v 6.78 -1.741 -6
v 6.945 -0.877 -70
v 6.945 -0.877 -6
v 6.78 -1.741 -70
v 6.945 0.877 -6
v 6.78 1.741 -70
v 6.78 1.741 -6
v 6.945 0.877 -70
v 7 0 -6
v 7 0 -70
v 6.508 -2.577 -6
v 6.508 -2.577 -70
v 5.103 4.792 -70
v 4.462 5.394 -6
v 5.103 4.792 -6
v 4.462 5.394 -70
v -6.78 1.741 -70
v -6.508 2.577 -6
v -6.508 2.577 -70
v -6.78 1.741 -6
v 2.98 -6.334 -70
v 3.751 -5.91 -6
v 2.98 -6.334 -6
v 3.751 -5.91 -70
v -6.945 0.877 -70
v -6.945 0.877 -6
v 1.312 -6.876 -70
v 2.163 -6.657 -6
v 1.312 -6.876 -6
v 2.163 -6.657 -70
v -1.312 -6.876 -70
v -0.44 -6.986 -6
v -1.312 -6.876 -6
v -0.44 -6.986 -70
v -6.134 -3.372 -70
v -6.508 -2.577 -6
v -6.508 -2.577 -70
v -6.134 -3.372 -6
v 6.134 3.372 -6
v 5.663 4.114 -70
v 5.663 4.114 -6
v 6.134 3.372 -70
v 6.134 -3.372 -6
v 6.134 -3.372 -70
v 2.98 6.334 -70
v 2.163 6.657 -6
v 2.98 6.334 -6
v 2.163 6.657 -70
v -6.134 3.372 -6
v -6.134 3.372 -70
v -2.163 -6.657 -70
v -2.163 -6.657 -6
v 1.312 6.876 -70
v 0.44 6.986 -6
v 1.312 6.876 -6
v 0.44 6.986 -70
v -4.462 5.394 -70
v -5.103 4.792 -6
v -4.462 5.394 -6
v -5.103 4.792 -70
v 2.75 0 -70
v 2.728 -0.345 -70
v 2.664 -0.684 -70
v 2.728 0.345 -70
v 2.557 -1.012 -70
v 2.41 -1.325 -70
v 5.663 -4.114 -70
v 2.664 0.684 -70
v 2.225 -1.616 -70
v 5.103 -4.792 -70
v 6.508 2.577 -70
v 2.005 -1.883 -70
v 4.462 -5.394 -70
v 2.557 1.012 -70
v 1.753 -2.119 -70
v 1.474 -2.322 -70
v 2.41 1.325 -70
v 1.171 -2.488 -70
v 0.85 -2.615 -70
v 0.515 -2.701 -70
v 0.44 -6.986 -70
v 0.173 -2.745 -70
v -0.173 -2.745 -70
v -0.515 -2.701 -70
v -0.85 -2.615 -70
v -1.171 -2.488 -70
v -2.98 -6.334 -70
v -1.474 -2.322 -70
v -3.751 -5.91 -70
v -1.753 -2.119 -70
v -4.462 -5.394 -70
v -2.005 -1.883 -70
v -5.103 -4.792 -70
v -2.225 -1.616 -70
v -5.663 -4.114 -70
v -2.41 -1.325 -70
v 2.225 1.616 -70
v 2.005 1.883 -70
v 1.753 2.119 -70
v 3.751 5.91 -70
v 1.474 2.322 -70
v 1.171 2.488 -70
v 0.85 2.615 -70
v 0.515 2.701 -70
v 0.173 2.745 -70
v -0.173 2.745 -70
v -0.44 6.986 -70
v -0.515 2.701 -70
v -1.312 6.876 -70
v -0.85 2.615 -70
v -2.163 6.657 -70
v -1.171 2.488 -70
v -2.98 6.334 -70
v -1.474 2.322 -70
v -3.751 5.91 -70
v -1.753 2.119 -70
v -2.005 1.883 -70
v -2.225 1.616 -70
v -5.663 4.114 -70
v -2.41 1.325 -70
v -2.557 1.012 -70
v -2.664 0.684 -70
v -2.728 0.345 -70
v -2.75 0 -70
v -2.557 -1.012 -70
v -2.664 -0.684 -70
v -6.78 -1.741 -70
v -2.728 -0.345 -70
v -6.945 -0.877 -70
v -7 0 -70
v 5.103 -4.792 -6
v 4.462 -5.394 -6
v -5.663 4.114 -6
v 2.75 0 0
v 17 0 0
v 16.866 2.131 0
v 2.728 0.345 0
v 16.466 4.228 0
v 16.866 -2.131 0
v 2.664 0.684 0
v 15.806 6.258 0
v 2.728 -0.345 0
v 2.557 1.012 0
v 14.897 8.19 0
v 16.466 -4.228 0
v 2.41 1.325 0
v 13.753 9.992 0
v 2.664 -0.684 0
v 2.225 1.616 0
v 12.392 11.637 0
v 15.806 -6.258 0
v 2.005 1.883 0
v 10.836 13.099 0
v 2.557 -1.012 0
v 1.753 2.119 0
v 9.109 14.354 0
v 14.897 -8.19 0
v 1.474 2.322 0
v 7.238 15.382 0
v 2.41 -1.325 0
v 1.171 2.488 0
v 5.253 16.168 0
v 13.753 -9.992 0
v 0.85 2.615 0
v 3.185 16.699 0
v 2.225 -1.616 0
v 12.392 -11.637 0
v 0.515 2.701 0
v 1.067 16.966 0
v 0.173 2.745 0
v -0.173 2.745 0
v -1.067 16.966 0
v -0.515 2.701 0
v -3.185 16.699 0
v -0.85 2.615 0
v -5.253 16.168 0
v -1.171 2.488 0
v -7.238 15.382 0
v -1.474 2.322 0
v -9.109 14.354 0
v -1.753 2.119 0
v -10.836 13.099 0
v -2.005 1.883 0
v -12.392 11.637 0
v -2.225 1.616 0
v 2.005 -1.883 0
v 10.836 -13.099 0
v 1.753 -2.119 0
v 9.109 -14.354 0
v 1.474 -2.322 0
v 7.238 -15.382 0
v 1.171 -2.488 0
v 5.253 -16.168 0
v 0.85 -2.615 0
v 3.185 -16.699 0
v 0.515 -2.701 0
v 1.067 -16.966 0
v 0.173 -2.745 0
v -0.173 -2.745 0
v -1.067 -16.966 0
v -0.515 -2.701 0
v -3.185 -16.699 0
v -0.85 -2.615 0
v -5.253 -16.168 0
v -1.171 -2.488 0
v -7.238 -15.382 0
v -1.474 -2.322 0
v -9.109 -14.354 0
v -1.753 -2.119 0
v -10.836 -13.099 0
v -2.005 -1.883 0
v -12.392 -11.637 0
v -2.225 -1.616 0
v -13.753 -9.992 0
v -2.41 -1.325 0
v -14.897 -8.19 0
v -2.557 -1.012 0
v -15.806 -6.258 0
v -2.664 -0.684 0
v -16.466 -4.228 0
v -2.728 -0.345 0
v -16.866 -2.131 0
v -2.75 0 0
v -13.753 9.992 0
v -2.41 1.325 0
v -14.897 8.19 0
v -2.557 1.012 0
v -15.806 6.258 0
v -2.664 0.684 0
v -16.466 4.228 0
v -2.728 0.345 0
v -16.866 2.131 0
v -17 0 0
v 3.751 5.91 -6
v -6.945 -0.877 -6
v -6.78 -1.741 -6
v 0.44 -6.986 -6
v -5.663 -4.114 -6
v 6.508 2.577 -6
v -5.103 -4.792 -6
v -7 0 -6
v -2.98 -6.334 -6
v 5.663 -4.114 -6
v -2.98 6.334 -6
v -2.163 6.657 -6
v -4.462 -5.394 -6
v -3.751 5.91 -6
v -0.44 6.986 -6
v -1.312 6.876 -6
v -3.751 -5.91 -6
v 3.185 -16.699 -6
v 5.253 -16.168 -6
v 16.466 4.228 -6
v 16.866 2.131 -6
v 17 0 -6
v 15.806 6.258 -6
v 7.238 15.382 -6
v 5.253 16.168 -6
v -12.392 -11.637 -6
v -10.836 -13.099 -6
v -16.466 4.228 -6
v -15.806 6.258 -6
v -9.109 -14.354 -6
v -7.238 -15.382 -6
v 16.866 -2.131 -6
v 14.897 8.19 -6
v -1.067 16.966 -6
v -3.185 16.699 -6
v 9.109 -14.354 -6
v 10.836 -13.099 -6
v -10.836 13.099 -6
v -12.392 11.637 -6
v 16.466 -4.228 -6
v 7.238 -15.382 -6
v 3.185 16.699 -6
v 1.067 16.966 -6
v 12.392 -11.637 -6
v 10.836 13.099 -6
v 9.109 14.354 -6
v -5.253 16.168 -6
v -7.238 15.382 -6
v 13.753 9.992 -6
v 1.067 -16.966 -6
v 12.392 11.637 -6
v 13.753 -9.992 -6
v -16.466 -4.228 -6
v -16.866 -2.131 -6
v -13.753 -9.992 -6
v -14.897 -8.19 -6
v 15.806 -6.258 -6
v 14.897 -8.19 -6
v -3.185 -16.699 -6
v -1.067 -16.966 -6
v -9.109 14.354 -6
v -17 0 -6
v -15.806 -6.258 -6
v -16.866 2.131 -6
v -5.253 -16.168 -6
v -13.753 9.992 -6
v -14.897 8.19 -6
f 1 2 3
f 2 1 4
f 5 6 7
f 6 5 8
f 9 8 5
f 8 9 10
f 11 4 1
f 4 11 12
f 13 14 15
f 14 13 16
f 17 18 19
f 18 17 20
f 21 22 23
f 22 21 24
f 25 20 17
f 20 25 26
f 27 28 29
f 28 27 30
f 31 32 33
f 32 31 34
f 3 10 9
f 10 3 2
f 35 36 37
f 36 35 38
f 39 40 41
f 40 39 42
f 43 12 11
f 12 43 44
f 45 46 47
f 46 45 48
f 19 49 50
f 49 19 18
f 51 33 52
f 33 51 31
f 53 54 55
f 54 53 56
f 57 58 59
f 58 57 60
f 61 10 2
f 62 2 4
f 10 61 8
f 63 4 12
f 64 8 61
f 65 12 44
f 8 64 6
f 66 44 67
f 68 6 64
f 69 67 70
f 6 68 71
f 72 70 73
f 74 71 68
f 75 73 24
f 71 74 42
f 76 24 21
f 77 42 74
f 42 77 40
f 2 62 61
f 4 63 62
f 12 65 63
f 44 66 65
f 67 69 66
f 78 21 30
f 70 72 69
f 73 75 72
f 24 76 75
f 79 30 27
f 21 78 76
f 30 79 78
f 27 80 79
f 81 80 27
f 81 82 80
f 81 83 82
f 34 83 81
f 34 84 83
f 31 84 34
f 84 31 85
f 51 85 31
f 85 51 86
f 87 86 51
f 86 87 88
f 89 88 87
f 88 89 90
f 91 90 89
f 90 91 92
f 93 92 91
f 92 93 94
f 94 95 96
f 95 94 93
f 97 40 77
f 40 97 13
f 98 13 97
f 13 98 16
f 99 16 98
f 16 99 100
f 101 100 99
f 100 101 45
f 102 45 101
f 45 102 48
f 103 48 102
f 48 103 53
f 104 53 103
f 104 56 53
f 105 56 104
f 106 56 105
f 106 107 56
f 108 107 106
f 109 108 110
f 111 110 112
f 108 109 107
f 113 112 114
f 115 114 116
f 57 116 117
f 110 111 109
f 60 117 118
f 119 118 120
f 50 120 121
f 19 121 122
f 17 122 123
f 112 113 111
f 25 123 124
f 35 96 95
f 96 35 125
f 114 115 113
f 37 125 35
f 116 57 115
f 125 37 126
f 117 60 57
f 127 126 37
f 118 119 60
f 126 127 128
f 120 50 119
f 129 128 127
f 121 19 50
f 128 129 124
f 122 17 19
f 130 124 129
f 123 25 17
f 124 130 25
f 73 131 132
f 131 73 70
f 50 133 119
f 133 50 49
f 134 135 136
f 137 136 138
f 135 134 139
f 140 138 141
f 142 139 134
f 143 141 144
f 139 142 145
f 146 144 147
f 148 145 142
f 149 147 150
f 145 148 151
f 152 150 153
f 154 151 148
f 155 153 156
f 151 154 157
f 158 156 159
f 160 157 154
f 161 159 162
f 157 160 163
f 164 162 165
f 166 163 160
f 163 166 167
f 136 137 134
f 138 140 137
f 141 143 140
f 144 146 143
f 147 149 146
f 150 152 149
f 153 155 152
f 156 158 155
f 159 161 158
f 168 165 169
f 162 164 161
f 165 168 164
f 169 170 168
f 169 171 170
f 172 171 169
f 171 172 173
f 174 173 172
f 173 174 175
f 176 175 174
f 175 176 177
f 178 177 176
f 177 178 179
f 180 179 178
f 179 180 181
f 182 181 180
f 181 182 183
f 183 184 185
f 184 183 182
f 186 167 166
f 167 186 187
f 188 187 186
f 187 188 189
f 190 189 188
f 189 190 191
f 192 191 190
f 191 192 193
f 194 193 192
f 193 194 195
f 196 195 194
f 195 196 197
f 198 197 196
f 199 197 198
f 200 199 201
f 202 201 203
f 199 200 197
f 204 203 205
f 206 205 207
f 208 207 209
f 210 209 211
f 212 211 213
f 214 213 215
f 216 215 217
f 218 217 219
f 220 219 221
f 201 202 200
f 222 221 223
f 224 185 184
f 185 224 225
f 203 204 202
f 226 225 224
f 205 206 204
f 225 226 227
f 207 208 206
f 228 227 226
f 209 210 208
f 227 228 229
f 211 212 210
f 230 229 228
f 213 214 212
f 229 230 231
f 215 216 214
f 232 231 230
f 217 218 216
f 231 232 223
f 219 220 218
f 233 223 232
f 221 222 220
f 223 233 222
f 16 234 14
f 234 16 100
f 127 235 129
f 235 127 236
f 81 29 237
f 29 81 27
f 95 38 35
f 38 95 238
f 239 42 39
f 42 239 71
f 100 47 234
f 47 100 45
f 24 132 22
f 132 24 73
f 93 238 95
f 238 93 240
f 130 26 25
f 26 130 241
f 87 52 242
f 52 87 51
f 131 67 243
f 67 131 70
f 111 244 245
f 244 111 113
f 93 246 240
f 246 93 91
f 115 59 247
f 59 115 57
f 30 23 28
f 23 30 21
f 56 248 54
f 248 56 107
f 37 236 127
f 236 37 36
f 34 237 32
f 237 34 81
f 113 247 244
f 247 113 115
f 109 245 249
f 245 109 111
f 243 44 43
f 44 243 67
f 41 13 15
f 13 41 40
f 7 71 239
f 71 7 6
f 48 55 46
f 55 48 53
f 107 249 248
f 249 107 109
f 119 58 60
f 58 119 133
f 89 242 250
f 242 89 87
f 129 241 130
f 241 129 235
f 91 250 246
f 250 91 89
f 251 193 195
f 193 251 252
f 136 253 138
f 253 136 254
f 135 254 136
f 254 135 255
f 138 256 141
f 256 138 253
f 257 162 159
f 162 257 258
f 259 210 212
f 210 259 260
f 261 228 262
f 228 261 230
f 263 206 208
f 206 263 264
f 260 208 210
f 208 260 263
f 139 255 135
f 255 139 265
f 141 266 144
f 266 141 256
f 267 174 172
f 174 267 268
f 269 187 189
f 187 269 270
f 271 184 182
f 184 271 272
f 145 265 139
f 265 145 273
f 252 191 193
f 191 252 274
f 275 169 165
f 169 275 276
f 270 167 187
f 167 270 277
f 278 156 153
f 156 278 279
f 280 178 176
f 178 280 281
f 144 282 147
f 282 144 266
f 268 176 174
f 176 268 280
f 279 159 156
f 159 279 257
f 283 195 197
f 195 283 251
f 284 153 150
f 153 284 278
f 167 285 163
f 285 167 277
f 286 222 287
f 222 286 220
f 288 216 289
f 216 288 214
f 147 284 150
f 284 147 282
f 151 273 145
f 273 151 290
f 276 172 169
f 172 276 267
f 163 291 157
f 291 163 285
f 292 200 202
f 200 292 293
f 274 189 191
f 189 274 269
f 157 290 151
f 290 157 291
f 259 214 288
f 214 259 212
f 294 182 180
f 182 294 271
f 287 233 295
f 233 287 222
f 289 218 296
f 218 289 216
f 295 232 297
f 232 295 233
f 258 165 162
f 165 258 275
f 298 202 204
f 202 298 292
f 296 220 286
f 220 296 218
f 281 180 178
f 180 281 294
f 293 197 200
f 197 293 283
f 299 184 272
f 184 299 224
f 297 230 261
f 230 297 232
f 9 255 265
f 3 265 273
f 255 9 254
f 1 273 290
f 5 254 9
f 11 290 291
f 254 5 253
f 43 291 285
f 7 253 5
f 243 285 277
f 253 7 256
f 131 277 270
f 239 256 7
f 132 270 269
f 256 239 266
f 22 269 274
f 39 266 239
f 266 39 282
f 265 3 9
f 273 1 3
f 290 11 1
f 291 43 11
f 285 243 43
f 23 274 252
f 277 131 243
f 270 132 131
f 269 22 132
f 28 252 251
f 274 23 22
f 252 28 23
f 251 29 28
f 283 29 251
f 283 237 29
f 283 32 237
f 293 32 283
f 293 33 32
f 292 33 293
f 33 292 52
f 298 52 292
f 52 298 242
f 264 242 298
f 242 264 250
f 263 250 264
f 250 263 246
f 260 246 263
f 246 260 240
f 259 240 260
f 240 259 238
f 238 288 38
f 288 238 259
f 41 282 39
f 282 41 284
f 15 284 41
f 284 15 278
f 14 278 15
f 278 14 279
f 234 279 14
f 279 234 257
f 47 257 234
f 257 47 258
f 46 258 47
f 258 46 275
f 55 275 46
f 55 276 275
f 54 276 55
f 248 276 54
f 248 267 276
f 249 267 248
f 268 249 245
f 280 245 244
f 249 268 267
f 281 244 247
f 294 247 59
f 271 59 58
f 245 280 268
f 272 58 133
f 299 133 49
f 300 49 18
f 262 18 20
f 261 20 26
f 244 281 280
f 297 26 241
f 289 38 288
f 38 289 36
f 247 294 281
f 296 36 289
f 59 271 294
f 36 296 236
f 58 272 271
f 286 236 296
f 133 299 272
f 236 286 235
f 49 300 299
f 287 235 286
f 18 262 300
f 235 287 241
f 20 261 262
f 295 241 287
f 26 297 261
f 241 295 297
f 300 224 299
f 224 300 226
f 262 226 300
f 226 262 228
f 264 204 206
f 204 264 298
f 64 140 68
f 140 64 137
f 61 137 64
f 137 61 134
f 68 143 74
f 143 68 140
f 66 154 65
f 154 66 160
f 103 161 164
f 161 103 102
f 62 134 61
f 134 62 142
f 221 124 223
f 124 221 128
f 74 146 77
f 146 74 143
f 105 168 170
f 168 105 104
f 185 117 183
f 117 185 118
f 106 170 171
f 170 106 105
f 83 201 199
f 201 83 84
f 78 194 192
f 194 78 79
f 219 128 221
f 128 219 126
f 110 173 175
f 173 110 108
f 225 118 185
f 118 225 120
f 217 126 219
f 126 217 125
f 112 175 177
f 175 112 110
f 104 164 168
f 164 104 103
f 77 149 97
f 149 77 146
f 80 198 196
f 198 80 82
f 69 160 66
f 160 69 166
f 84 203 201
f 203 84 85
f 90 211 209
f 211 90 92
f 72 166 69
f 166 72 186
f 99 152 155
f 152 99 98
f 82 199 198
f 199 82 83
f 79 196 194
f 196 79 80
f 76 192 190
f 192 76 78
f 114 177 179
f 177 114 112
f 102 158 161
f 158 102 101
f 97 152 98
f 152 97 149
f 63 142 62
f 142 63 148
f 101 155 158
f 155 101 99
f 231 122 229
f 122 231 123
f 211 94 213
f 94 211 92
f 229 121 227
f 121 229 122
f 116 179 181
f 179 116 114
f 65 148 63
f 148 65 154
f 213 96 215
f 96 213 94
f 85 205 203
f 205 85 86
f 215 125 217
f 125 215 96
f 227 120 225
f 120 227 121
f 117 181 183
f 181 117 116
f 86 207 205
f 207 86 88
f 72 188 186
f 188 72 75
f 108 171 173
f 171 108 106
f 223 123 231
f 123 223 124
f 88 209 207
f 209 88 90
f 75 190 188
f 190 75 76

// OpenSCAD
$fn = 50;


difference() {
	union() {
		translate(v = [0, 0, -70.0000000000]) {
			cylinder(h = 70, r = 7.0000000000);
		}
		translate(v = [0, 0, -6.0000000000]) {
			cylinder(h = 6, r = 17.0000000000);
		}
	}
	union() {
		#translate(v = [0, 0, -70]) {
			cylinder(h = 70, r = 2.7500000000);
		}
	}
}
